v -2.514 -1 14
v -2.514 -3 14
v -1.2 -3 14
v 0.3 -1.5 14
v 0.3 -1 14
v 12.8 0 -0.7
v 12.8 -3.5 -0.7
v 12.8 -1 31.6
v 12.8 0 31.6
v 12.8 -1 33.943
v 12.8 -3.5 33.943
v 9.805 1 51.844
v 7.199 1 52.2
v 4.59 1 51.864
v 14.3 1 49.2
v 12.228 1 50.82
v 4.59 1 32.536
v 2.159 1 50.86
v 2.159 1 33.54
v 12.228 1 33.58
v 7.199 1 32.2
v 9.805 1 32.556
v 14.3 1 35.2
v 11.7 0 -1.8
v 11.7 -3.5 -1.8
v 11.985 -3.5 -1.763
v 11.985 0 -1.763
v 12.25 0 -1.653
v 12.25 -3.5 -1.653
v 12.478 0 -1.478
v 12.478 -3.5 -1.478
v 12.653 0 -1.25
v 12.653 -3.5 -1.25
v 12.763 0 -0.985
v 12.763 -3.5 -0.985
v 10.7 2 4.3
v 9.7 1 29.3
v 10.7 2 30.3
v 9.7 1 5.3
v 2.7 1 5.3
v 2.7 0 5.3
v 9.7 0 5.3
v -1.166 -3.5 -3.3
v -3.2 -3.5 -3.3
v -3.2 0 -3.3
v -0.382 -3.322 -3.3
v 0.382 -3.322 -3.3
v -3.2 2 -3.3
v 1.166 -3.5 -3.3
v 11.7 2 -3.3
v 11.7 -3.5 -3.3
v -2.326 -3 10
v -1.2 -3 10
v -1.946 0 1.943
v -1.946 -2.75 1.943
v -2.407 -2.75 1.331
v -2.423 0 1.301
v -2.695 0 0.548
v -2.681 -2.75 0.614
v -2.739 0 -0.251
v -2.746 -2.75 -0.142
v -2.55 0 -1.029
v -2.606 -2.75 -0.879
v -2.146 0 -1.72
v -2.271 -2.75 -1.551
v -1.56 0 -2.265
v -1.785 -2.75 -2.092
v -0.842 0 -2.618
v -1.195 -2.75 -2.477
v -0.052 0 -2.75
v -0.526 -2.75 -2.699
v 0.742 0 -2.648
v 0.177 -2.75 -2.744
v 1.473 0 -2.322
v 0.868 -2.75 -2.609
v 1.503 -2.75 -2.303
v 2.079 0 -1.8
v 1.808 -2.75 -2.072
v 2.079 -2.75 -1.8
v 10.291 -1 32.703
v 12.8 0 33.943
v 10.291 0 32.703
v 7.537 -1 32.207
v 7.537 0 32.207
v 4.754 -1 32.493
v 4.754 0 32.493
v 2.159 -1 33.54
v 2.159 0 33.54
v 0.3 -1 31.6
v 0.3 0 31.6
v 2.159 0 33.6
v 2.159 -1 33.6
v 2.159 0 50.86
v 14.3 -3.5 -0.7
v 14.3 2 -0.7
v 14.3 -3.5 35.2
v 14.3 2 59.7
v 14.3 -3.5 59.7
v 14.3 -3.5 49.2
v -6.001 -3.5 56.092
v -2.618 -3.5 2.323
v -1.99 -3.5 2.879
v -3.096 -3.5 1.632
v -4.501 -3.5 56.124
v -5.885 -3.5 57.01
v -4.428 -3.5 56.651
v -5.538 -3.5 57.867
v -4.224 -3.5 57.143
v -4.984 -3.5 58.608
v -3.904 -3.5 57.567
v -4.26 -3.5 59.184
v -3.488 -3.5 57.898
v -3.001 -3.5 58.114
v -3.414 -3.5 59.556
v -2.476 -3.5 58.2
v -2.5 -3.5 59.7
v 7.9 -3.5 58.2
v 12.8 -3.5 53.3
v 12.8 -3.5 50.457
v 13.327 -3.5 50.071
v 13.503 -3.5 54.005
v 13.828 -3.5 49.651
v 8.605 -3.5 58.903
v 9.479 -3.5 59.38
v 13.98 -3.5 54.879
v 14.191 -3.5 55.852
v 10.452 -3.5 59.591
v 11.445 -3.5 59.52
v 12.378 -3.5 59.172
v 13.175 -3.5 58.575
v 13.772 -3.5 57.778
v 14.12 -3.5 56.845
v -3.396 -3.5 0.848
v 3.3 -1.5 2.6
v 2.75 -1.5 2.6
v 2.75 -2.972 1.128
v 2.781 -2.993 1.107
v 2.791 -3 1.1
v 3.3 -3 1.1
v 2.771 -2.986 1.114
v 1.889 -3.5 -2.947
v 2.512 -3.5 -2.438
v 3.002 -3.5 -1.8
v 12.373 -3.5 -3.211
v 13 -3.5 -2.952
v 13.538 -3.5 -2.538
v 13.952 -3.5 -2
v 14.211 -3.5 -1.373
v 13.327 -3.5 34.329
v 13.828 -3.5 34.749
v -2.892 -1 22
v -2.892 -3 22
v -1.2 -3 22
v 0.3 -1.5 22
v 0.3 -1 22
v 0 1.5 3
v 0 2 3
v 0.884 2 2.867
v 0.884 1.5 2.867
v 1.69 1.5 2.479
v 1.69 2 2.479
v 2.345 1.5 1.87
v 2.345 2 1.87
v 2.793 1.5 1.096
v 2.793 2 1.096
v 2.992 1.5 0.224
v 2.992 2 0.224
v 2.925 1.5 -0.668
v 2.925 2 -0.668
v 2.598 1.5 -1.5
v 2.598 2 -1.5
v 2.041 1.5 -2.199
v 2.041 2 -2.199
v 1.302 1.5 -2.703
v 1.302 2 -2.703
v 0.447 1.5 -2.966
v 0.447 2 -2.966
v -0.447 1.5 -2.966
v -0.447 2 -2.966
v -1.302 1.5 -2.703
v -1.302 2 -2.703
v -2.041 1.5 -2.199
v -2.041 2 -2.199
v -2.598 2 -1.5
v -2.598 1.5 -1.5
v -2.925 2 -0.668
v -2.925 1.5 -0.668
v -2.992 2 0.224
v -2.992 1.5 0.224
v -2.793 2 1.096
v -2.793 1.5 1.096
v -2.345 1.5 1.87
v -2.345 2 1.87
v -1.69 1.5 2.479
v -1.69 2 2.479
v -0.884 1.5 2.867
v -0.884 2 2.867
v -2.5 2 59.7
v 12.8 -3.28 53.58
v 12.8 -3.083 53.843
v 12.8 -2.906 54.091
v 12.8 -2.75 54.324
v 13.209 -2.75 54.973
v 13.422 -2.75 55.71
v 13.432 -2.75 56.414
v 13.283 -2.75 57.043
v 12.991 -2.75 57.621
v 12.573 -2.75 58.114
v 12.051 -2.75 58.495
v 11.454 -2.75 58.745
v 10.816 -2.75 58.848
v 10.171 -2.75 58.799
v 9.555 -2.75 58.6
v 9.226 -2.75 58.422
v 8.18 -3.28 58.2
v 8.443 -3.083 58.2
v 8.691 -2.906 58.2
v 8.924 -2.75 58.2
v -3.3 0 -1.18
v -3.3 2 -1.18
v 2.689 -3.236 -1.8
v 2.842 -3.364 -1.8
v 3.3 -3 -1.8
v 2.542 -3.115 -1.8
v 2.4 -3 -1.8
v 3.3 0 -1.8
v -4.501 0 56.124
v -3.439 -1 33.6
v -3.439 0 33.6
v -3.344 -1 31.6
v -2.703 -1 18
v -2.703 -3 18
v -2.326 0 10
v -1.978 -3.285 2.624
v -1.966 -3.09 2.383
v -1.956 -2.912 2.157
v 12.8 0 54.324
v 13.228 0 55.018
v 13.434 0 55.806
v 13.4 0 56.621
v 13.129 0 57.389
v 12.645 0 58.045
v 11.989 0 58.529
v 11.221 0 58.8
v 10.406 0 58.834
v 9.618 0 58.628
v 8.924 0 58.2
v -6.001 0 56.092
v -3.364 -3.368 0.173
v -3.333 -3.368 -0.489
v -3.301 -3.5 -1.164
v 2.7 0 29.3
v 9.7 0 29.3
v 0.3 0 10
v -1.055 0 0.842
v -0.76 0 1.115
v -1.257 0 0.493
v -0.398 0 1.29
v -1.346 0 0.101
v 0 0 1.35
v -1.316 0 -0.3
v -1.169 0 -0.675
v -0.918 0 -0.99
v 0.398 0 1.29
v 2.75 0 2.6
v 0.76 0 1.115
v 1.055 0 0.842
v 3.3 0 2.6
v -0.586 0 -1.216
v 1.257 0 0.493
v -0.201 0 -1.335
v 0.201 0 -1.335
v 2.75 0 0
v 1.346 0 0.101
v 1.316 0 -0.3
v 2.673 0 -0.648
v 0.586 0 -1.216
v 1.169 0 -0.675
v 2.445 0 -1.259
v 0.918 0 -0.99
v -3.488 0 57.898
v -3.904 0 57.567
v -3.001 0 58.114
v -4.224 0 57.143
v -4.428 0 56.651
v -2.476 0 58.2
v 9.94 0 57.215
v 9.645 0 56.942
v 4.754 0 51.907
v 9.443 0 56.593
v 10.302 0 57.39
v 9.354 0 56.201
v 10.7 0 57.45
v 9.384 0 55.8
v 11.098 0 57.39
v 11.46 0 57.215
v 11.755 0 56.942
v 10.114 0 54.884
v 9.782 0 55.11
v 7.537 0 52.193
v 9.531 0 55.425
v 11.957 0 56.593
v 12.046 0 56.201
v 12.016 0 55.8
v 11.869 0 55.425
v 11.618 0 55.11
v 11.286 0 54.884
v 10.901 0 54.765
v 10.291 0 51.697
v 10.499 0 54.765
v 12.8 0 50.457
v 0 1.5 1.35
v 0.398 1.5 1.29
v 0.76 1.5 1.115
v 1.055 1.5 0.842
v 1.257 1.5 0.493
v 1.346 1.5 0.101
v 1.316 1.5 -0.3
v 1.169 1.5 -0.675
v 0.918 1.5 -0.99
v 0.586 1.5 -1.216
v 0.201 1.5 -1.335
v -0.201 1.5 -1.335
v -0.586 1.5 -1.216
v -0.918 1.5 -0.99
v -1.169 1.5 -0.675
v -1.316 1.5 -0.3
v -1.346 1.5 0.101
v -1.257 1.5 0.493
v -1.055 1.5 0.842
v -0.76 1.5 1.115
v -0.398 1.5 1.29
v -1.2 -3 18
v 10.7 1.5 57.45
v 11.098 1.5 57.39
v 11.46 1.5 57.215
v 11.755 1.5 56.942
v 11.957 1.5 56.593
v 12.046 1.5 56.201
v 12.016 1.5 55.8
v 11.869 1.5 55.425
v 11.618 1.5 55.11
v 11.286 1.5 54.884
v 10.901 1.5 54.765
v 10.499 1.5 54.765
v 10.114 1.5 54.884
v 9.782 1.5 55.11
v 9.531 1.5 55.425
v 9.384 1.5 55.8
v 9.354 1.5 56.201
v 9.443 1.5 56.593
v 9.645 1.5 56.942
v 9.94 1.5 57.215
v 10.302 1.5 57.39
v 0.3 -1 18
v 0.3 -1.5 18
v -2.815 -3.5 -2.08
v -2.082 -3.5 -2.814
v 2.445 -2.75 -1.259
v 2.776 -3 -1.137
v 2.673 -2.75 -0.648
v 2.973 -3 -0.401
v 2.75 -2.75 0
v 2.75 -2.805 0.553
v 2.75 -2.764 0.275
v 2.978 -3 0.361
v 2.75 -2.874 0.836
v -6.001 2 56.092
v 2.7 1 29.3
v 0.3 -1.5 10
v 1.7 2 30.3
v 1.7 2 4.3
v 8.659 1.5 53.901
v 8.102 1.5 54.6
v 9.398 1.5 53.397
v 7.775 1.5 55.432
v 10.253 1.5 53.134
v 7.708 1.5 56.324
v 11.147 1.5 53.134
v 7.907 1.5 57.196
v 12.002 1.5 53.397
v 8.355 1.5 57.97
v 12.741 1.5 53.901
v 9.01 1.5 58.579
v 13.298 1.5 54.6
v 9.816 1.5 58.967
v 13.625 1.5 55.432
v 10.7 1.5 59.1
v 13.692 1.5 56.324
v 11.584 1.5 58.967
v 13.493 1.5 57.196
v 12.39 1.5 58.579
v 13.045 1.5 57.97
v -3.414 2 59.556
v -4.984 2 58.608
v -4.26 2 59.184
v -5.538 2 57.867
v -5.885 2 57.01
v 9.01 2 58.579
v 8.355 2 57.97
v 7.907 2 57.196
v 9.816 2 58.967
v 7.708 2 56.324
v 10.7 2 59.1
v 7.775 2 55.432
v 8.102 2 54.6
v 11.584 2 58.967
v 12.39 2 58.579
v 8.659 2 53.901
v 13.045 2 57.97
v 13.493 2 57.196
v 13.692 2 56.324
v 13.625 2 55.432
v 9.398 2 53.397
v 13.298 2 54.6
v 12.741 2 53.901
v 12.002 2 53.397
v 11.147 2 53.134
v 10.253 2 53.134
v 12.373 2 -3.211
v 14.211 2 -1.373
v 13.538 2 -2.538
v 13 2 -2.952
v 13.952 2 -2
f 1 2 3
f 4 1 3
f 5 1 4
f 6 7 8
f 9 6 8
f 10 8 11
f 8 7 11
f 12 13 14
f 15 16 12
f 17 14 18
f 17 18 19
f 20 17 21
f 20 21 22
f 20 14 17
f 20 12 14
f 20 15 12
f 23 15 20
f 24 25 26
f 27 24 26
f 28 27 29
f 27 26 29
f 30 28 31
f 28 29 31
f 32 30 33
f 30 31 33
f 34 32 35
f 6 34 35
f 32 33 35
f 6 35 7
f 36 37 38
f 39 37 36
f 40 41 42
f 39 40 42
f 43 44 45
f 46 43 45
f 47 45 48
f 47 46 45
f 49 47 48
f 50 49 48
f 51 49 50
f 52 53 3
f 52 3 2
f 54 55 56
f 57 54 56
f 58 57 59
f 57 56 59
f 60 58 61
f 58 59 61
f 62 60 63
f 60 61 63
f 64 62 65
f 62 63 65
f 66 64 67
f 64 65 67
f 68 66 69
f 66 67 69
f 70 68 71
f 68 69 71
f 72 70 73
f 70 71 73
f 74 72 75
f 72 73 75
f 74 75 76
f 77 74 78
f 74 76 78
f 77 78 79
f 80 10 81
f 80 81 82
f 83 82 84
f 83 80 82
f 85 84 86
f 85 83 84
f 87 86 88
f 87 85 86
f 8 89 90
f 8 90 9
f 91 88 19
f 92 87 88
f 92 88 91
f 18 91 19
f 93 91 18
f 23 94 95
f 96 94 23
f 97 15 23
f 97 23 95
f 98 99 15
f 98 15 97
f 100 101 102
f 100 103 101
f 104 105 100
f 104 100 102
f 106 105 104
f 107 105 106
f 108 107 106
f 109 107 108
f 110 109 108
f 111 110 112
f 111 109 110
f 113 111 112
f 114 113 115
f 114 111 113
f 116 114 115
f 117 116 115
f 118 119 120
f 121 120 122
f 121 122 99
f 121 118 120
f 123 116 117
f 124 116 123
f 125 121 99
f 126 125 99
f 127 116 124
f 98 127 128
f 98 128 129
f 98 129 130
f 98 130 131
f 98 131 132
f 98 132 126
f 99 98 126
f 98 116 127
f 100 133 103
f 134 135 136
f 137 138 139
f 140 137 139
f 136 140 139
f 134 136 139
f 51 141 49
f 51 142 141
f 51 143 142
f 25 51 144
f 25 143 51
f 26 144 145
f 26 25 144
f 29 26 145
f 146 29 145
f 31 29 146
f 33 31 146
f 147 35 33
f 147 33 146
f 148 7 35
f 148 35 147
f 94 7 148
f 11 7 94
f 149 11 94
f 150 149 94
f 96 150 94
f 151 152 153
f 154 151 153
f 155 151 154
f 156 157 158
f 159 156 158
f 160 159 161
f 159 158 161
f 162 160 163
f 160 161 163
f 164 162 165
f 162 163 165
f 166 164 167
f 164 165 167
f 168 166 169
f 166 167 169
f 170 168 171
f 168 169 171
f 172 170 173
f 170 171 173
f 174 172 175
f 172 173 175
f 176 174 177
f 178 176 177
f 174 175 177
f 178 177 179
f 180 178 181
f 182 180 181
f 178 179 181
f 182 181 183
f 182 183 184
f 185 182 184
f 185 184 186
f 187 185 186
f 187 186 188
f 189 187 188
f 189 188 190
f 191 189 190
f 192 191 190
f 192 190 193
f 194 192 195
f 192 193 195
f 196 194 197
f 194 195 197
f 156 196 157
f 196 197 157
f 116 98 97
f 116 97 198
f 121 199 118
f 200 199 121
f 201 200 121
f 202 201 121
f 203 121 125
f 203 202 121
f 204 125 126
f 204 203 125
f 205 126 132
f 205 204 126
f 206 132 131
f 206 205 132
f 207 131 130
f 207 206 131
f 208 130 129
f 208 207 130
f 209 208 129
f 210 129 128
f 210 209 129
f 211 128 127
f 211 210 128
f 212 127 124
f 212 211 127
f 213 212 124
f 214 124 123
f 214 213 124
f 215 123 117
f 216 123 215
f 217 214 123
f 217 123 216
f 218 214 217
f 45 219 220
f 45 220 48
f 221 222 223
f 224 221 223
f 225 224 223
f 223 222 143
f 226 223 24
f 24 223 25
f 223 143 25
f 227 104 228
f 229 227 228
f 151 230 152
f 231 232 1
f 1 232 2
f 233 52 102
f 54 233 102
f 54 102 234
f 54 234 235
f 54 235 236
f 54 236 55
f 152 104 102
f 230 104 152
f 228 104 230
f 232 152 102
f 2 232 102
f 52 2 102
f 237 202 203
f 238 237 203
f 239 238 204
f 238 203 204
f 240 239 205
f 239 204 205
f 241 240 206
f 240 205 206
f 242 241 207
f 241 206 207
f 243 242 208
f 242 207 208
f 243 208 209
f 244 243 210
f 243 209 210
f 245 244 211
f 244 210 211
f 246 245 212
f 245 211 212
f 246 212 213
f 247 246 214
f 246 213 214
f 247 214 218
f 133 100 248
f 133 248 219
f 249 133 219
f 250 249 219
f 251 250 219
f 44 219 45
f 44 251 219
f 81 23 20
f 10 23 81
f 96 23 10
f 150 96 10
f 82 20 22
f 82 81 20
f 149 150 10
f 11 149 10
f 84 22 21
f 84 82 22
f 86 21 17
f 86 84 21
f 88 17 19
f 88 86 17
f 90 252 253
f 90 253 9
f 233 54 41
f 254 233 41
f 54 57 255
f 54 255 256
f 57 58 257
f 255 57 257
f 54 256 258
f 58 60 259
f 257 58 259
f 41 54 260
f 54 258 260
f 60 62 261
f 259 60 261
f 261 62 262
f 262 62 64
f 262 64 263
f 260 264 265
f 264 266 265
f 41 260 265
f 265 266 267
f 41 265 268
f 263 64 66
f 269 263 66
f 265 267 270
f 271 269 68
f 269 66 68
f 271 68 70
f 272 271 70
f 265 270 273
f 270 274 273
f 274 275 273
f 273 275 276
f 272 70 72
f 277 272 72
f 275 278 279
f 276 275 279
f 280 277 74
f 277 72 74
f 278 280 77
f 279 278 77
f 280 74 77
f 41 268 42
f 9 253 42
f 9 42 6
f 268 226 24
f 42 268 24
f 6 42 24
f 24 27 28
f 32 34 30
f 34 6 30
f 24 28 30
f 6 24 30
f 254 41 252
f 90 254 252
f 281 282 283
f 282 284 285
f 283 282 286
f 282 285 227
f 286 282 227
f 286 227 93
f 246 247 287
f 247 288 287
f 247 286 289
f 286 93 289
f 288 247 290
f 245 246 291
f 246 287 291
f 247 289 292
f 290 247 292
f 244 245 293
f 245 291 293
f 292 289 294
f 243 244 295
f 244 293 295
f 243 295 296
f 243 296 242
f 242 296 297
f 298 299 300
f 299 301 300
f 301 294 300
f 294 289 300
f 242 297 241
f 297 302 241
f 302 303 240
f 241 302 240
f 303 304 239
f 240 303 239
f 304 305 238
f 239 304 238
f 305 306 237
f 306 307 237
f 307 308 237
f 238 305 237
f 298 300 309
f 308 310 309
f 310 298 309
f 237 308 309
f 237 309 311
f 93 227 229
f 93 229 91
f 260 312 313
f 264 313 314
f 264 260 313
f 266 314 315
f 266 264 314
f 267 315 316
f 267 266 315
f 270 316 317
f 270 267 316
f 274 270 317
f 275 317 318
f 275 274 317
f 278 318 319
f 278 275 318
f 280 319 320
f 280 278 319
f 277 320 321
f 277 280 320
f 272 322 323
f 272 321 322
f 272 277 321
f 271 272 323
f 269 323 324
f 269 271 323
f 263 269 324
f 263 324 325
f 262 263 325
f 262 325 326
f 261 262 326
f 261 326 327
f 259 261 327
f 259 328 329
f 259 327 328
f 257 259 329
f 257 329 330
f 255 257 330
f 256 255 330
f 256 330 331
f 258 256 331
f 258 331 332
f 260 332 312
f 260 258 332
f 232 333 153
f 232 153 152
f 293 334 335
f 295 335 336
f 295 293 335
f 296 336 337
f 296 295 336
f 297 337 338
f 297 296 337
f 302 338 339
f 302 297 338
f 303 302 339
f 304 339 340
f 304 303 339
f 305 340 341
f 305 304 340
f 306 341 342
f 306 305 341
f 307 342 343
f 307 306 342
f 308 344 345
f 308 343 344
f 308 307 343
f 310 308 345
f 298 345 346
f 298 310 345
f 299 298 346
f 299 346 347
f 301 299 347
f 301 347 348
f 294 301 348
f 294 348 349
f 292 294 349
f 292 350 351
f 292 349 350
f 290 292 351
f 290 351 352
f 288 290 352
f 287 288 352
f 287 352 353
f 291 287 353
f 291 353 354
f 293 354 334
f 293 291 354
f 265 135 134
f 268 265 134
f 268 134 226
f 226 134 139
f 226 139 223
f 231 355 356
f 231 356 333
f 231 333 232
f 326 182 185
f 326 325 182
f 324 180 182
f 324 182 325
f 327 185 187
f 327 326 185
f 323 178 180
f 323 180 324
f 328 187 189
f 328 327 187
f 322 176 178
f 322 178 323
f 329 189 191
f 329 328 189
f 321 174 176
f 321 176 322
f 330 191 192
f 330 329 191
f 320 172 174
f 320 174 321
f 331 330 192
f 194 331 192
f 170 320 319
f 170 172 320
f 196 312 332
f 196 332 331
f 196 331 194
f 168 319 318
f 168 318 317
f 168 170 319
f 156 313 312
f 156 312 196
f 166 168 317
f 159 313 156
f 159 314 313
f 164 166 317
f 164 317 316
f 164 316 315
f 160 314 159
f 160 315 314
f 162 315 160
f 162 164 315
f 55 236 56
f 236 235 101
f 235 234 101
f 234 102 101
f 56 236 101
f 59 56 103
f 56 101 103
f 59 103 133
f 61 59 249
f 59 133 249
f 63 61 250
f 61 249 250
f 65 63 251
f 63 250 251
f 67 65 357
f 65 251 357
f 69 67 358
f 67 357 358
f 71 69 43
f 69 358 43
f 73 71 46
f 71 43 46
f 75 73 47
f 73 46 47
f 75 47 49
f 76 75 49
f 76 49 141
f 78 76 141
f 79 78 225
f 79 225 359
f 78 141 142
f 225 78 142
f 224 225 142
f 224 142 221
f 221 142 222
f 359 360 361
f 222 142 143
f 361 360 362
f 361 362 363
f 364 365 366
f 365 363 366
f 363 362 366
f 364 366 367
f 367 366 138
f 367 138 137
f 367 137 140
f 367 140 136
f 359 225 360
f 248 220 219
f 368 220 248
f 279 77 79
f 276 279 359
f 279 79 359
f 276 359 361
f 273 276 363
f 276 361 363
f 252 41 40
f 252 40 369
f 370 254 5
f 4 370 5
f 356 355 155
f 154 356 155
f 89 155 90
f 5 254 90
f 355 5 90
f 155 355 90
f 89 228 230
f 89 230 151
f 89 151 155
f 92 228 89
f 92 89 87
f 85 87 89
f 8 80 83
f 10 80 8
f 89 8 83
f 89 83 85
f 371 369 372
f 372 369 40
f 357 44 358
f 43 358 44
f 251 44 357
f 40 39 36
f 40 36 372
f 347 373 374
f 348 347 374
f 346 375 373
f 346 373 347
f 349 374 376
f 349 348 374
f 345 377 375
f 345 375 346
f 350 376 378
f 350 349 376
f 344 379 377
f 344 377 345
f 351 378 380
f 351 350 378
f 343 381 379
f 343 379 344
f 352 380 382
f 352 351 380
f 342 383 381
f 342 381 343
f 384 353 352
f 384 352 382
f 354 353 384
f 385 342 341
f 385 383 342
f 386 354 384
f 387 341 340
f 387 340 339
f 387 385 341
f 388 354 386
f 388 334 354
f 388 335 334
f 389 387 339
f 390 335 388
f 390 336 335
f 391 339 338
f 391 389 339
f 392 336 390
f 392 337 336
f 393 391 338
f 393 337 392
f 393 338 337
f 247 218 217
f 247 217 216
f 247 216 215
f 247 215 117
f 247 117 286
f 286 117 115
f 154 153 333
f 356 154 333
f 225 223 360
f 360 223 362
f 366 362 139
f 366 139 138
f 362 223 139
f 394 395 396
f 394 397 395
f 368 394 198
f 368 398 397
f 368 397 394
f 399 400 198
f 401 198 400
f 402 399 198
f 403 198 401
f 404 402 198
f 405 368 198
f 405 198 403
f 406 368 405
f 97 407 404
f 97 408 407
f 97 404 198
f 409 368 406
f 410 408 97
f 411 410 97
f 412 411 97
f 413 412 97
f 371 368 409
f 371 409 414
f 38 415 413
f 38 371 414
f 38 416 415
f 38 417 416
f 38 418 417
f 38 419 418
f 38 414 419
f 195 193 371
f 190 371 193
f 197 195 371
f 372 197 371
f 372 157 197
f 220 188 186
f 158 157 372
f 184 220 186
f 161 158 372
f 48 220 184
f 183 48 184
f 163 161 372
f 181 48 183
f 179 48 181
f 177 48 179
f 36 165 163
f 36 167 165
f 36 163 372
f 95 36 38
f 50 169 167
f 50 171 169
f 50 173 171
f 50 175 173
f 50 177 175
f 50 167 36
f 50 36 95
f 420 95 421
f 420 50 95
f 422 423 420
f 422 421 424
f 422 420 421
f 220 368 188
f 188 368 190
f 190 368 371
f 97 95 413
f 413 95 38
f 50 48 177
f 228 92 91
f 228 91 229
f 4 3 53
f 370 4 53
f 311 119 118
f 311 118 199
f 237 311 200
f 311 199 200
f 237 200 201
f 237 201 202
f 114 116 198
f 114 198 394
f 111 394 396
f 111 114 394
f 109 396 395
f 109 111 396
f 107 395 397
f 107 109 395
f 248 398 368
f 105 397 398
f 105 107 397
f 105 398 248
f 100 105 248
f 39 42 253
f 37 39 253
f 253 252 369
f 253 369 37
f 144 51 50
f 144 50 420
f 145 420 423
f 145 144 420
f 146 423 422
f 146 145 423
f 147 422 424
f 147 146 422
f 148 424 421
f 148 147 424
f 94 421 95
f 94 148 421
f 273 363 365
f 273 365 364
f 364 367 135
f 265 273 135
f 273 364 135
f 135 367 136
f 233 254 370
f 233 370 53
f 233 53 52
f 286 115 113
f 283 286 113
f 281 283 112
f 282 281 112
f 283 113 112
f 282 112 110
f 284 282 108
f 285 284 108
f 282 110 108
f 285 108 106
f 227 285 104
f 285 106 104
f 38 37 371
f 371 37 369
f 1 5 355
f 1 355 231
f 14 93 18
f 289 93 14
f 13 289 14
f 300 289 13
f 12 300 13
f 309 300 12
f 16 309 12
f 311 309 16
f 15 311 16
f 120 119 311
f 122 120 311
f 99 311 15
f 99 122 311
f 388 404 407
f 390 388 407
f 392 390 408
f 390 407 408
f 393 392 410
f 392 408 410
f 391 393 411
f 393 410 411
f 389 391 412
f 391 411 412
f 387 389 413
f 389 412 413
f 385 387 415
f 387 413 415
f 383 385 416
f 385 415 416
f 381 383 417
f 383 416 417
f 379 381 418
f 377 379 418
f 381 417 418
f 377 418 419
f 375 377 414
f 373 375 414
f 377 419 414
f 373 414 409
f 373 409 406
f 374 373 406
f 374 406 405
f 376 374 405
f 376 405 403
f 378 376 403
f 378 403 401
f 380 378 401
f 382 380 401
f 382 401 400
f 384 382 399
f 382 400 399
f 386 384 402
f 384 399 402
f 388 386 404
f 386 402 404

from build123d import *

# Parameters (mm, degrees)
SKETCH_1_R               = 1.35
EXTRUDE_1_DEPTH          = 2
EXTRUDE_2_DEPTH          = 2
CUT_EXTRUDE_1_DEPTH      = 62.421331799
CUT_EXTRUDE_1_DEPTH_BACK = 62.421331799
EXTRUDE_START            = 3.5
EXTRUDE_3_DEPTH          = 3.5
SKETCH_5_W               = 14
SKETCH_5_H               = 4.5
CUT_EXTRUDE_2_DEPTH      = 9
CUT_EXTRUDE_3_REACH      = 63.635
SKETCH_7_W               = 7
SKETCH_7_H               = 24
CUT_EXTRUDE_4_DEPTH      = 62.488454201
CHAMFER_1_SIZE           = 1
EXTRUDE_4_DEPTH          = 3
EXTRUDE_START_2          = 3
EXTRUDE_5_DEPTH          = 3
CHAMFER_2_SIZE           = 1.5
EXTRUDE_6_DEPTH          = 1
EXTRUDE_START_3          = 1
EXTRUDE_7_DEPTH          = 1
SKETCH_12_R              = 3
CUT_EXTRUDE_5_DEPTH      = 0.5


with BuildPart() as part:
    # 草图1 → 凸台-拉伸1 (new body)
    with BuildSketch(Plane(origin=(0, 0, 0), x_dir=(1, 0, 0), z_dir=(0, 1, 0))):
        with BuildLine():
            Line((0, 3.3), (11.7, 3.3))
            ThreePointArc((11.7, 3.3), (13.538477631, 2.538477631), (14.3, 0.7))
            Line((14.3, 0.7), (14.3, -59.7))
            Line((14.3, -59.7), (-3.3, -59.7))
            Line((-3.3, -59.7), (-3.3, 0))
            Line((-3.3, 0), (-3.3, 3.3))
            Line((-3.3, 3.3), (0, 3.3))
        make_face()
        with Locations(Location((0, 0, 0), (0, 0, 270))):
            Circle(SKETCH_1_R, mode=Mode.SUBTRACT)
        with Locations(Location((10.7, -56.1, 0), (0, 0, 270))):
            Circle(SKETCH_1_R, mode=Mode.SUBTRACT)
    extrude(amount=EXTRUDE_1_DEPTH)

    # 草图2 → 凸台-拉伸2 (add)
    with BuildSketch(Plane(origin=(0, 2, 0), x_dir=(1, 0, 0), z_dir=(0, 1, 0))):
        Polygon((-3.3, 1.179910787), (-6.171573065, -59.7), (-3.3, -59.7), align=None)
    extrude(amount=-EXTRUDE_2_DEPTH)

    # 草图3 → 切除-拉伸1 (cut, two sides: drawn at the far end of the back side and taken through both)
    with BuildSketch(Plane(origin=(0, 2, 0), x_dir=(1, 0, 0), z_dir=(0, 1, 0)).offset(-CUT_EXTRUDE_1_DEPTH_BACK)):
        Polygon((-3.3, 3.3), (-3.3, 1.179910787), (-3.2, 3.3), align=None)
        with BuildLine():
            ThreePointArc((-2.499988961, -59.7), (-4.984483511, -58.608076588), (-6.001389, -56.091946))
            Line((-6.001389, -56.091946), (-6.171573065, -59.7))
            Line((-6.171573065, -59.7), (-2.499988961, -59.7))
        make_face()
    extrude(amount=CUT_EXTRUDE_1_DEPTH + CUT_EXTRUDE_1_DEPTH_BACK, mode=Mode.SUBTRACT)

    # 草图4 → 凸台-拉伸3 (add)
    with BuildSketch(Plane.XZ.offset(EXTRUDE_START)):
        with BuildLine():
            Line((-6.001389, 56.091946), (-3.2, -3.3))
            Line((-3.2, -3.3), (11.7, -3.3))
            ThreePointArc((11.7, -3.3), (13.538477631, -2.538477631), (14.3, -0.7))
            Line((14.3, -0.7), (14.3, 59.7))
            Line((14.3, 59.7), (-2.499988961, 59.7))
            ThreePointArc((-2.499988961, 59.7), (-4.984483511, 58.608076588), (-6.001389, 56.091946))
        make_face()
        with BuildLine():
            Line((12.8, -0.7), (12.8, 54.32447191))
            ThreePointArc((12.8, 54.32447191), (12.644543648, 58.044543648), (8.92447191, 58.2))
            Line((8.92447191, 58.2), (-2.476371899, 58.2))
            ThreePointArc((-2.476371899, 58.2), (-3.904150356, 57.567435732), (-4.501255338, 56.124468472))
            Line((-4.501255338, 56.124468472), (-1.945653662, 1.943433001))
            ThreePointArc((-1.945653662, 1.943433001), (-1.872904729, -2.013635488), (2.079062289, -1.8))
            Line((2.079062289, -1.8), (11.7, -1.8))
            ThreePointArc((11.7, -1.8), (12.477817459, -1.477817459), (12.8, -0.7))
        make_face(mode=Mode.SUBTRACT)
    extrude(amount=-EXTRUDE_3_DEPTH)

    # 草图5 → 切除-拉伸2 (cut)
    with BuildSketch(Plane(origin=(14.3, 0, 0), x_dir=(0, 0, -1), z_dir=(1, 0, 0))):
        with Locations((-42.2, -1.25)):
            Rectangle(SKETCH_5_W, SKETCH_5_H)
    extrude(amount=-CUT_EXTRUDE_2_DEPTH, mode=Mode.SUBTRACT)

    # 切除-拉伸3: up to this face of the body (flat: up to its plane)
    cut_extrude_3_end = Plane(part.part.faces().sort_by_distance((9.8, 1, 42.2))[0])
    # 草图6 → 切除-拉伸3 (cut, up to the picked face)
    with BuildSketch(Plane.XZ.offset(3.5), mode=Mode.PRIVATE) as cut_extrude_3_sk1:
        with BuildLine():
            Line((2.158571571, 33.539745962), (2.158571571, 50.860254038))
            ThreePointArc((2.158571571, 50.860254038), (17.158571571, 42.2), (2.158571571, 33.539745962))
        make_face()
    cut_extrude_3_tool1 = split(extrude(cut_extrude_3_sk1.sketch, amount=-CUT_EXTRUDE_3_REACH, mode=Mode.PRIVATE), bisect_by=cut_extrude_3_end, keep=Keep.BOTH, mode=Mode.PRIVATE)
    add(cut_extrude_3_tool1.solids().sort_by(Axis((8.87184, -3.5, 42.2), (0, 1, 0)))[0], mode=Mode.SUBTRACT)

    # 草图7 → 切除-拉伸4 (cut, through all)
    with BuildSketch(Plane.XZ):
        with Locations((6.2, 17.3)):
            Rectangle(SKETCH_7_W, SKETCH_7_H)
    extrude(amount=-CUT_EXTRUDE_4_DEPTH, mode=Mode.SUBTRACT)

    # 倒角1
    chamfer_1_edges = [part.edges().sort_by_distance(p)[0] for p in [
        (2.7, 2, 17.3),
        (6.2, 2, 29.3),
        (9.7, 2, 17.3),
        (6.2, 2, 5.3),
    ]]
    chamfer(chamfer_1_edges, length=CHAMFER_1_SIZE)

    # 草图8 → 凸台-拉伸4 (add)
    with BuildSketch(Plane.XZ):
        Polygon((-2.891678333, 22), (0.3, 22), (0.3, 18), (-2.703007027, 18), align=None)
        Polygon((-2.514335721, 14), (0.3, 14), (0.3, 10), (-2.325664416, 10), align=None)
    extrude(amount=EXTRUDE_4_DEPTH)

    # 草图9 → 凸台-拉伸5 (add)
    with BuildSketch(Plane.XZ.offset(EXTRUDE_START_2)):
        with BuildLine():
            Line((2.75, 0), (2.75, 2.6))
            Line((2.75, 2.6), (3.3, 2.6))
            Line((3.3, 2.6), (3.3, -1.8))
            Line((3.3, -1.8), (2.079062289, -1.8))
            ThreePointArc((2.079062289, -1.8), (2.576812109, -0.960489122), (2.75, 0))
        make_face()
    extrude(amount=-EXTRUDE_5_DEPTH)

    # 倒角2
    chamfer_2_edges = [part.edges().sort_by_distance(p)[0] for p in [
        (0.3, -3, 20),
        (0.3, -3, 12),
        (3.025, -3, 2.6),
    ]]
    chamfer(chamfer_2_edges, length=CHAMFER_2_SIZE)

    # 草图10 → 凸台-拉伸6 (add)
    with BuildSketch(Plane.XZ):
        Polygon((0.3, 22), (0.3, 31.6), (-3.344489466, 31.6), (-2.891678333, 22), align=None)
        Polygon((0.3, 18), (0.3, 14), (-2.514335721, 14), (-2.703007027, 18), align=None)
    extrude(amount=EXTRUDE_6_DEPTH)

    # 草图11 → 凸台-拉伸7 (add)
    with BuildSketch(Plane.XZ.offset(EXTRUDE_START_3)):
        with BuildLine():
            Line((0.3, 31.6), (12.8, 31.6))
            Line((12.8, 31.6), (12.8, 33.943227914))
            ThreePointArc((12.8, 33.943227914), (7.537460775, 32.207180429), (2.158571571, 33.539745962))
            Line((2.158571571, 33.539745962), (2.158571571, 33.6))
            Line((2.158571571, 33.6), (-3.438825119, 33.6))
            Line((-3.438825119, 33.6), (-3.344489466, 31.6))
            Line((-3.344489466, 31.6), (0.3, 31.6))
        make_face()
    extrude(amount=-EXTRUDE_7_DEPTH)

    # 草图12 → 切除-拉伸5 (cut)
    with BuildSketch(Plane(origin=(0, 2, 0), x_dir=(1, 0, 0), z_dir=(0, 1, 0))):
        with Locations(Location((0, 0, 0), (0, 0, 270))):
            Circle(SKETCH_12_R)
        with Locations(Location((10.7, -56.1, 0), (0, 0, 270))):
            Circle(SKETCH_12_R)
    extrude(amount=-CUT_EXTRUDE_5_DEPTH, mode=Mode.SUBTRACT)

    # 倒角3
    # the kernel refuses this chamfer: 0.75 mm, written as the material it takes off along each edge
    with BuildSketch(Plane(origin=(10.7, -3.5, 56.1), x_dir=(-0.7048818539423597, 0, -0.7093247295722755), z_dir=(-0.7093247295722755, 0, 0.7048818539423597))) as chamfer_3_piece_1:
        with BuildLine():
            Line((3.521213203, 0.021213203), (2.728786797, -0.771213203))
            Line((2.728786797, -0.771213203), (2.713786797, -0.771213203))
            ThreePointArc((2.713786797, -0.771213203), (2.735, -0.385606602), (2.735, 0))
            Line((2.735, 0), (2.75, 0.015))
            ThreePointArc((2.75, 0.015), (3.135606602, 0.015), (3.521213203, 0.036213203))
            Line((3.521213203, 0.036213203), (3.521213203, 0.021213203))
        make_face()
    revolve(axis=Axis((10.7, -3.5, 56.1), (0, -1, 0)), revolution_arc=359.64, mode=Mode.SUBTRACT)
    with BuildSketch(Plane(origin=(0, -3.5, 0), x_dir=(0.6787525361233852, 0, 0.7343670708209028), z_dir=(0.7343670708209028, 0, -0.6787525361233852))) as chamfer_3_piece_2:
        with BuildLine():
            Line((2.728786797, -0.771213203), (3.521213203, 0.021213203))
            Line((3.521213203, 0.021213203), (3.521213203, 0.036213203))
            ThreePointArc((3.521213203, 0.036213203), (3.135606602, 0.015), (2.75, 0.015))
            Line((2.75, 0.015), (2.735, 0))
            ThreePointArc((2.735, 0), (2.735, -0.385606602), (2.713786797, -0.771213203))
            Line((2.713786797, -0.771213203), (2.728786797, -0.771213203))
        make_face()
    revolve(axis=Axis((0, -3.5, 0), (0, -1, 0)), revolution_arc=359.64, mode=Mode.SUBTRACT)


solid = part.part
